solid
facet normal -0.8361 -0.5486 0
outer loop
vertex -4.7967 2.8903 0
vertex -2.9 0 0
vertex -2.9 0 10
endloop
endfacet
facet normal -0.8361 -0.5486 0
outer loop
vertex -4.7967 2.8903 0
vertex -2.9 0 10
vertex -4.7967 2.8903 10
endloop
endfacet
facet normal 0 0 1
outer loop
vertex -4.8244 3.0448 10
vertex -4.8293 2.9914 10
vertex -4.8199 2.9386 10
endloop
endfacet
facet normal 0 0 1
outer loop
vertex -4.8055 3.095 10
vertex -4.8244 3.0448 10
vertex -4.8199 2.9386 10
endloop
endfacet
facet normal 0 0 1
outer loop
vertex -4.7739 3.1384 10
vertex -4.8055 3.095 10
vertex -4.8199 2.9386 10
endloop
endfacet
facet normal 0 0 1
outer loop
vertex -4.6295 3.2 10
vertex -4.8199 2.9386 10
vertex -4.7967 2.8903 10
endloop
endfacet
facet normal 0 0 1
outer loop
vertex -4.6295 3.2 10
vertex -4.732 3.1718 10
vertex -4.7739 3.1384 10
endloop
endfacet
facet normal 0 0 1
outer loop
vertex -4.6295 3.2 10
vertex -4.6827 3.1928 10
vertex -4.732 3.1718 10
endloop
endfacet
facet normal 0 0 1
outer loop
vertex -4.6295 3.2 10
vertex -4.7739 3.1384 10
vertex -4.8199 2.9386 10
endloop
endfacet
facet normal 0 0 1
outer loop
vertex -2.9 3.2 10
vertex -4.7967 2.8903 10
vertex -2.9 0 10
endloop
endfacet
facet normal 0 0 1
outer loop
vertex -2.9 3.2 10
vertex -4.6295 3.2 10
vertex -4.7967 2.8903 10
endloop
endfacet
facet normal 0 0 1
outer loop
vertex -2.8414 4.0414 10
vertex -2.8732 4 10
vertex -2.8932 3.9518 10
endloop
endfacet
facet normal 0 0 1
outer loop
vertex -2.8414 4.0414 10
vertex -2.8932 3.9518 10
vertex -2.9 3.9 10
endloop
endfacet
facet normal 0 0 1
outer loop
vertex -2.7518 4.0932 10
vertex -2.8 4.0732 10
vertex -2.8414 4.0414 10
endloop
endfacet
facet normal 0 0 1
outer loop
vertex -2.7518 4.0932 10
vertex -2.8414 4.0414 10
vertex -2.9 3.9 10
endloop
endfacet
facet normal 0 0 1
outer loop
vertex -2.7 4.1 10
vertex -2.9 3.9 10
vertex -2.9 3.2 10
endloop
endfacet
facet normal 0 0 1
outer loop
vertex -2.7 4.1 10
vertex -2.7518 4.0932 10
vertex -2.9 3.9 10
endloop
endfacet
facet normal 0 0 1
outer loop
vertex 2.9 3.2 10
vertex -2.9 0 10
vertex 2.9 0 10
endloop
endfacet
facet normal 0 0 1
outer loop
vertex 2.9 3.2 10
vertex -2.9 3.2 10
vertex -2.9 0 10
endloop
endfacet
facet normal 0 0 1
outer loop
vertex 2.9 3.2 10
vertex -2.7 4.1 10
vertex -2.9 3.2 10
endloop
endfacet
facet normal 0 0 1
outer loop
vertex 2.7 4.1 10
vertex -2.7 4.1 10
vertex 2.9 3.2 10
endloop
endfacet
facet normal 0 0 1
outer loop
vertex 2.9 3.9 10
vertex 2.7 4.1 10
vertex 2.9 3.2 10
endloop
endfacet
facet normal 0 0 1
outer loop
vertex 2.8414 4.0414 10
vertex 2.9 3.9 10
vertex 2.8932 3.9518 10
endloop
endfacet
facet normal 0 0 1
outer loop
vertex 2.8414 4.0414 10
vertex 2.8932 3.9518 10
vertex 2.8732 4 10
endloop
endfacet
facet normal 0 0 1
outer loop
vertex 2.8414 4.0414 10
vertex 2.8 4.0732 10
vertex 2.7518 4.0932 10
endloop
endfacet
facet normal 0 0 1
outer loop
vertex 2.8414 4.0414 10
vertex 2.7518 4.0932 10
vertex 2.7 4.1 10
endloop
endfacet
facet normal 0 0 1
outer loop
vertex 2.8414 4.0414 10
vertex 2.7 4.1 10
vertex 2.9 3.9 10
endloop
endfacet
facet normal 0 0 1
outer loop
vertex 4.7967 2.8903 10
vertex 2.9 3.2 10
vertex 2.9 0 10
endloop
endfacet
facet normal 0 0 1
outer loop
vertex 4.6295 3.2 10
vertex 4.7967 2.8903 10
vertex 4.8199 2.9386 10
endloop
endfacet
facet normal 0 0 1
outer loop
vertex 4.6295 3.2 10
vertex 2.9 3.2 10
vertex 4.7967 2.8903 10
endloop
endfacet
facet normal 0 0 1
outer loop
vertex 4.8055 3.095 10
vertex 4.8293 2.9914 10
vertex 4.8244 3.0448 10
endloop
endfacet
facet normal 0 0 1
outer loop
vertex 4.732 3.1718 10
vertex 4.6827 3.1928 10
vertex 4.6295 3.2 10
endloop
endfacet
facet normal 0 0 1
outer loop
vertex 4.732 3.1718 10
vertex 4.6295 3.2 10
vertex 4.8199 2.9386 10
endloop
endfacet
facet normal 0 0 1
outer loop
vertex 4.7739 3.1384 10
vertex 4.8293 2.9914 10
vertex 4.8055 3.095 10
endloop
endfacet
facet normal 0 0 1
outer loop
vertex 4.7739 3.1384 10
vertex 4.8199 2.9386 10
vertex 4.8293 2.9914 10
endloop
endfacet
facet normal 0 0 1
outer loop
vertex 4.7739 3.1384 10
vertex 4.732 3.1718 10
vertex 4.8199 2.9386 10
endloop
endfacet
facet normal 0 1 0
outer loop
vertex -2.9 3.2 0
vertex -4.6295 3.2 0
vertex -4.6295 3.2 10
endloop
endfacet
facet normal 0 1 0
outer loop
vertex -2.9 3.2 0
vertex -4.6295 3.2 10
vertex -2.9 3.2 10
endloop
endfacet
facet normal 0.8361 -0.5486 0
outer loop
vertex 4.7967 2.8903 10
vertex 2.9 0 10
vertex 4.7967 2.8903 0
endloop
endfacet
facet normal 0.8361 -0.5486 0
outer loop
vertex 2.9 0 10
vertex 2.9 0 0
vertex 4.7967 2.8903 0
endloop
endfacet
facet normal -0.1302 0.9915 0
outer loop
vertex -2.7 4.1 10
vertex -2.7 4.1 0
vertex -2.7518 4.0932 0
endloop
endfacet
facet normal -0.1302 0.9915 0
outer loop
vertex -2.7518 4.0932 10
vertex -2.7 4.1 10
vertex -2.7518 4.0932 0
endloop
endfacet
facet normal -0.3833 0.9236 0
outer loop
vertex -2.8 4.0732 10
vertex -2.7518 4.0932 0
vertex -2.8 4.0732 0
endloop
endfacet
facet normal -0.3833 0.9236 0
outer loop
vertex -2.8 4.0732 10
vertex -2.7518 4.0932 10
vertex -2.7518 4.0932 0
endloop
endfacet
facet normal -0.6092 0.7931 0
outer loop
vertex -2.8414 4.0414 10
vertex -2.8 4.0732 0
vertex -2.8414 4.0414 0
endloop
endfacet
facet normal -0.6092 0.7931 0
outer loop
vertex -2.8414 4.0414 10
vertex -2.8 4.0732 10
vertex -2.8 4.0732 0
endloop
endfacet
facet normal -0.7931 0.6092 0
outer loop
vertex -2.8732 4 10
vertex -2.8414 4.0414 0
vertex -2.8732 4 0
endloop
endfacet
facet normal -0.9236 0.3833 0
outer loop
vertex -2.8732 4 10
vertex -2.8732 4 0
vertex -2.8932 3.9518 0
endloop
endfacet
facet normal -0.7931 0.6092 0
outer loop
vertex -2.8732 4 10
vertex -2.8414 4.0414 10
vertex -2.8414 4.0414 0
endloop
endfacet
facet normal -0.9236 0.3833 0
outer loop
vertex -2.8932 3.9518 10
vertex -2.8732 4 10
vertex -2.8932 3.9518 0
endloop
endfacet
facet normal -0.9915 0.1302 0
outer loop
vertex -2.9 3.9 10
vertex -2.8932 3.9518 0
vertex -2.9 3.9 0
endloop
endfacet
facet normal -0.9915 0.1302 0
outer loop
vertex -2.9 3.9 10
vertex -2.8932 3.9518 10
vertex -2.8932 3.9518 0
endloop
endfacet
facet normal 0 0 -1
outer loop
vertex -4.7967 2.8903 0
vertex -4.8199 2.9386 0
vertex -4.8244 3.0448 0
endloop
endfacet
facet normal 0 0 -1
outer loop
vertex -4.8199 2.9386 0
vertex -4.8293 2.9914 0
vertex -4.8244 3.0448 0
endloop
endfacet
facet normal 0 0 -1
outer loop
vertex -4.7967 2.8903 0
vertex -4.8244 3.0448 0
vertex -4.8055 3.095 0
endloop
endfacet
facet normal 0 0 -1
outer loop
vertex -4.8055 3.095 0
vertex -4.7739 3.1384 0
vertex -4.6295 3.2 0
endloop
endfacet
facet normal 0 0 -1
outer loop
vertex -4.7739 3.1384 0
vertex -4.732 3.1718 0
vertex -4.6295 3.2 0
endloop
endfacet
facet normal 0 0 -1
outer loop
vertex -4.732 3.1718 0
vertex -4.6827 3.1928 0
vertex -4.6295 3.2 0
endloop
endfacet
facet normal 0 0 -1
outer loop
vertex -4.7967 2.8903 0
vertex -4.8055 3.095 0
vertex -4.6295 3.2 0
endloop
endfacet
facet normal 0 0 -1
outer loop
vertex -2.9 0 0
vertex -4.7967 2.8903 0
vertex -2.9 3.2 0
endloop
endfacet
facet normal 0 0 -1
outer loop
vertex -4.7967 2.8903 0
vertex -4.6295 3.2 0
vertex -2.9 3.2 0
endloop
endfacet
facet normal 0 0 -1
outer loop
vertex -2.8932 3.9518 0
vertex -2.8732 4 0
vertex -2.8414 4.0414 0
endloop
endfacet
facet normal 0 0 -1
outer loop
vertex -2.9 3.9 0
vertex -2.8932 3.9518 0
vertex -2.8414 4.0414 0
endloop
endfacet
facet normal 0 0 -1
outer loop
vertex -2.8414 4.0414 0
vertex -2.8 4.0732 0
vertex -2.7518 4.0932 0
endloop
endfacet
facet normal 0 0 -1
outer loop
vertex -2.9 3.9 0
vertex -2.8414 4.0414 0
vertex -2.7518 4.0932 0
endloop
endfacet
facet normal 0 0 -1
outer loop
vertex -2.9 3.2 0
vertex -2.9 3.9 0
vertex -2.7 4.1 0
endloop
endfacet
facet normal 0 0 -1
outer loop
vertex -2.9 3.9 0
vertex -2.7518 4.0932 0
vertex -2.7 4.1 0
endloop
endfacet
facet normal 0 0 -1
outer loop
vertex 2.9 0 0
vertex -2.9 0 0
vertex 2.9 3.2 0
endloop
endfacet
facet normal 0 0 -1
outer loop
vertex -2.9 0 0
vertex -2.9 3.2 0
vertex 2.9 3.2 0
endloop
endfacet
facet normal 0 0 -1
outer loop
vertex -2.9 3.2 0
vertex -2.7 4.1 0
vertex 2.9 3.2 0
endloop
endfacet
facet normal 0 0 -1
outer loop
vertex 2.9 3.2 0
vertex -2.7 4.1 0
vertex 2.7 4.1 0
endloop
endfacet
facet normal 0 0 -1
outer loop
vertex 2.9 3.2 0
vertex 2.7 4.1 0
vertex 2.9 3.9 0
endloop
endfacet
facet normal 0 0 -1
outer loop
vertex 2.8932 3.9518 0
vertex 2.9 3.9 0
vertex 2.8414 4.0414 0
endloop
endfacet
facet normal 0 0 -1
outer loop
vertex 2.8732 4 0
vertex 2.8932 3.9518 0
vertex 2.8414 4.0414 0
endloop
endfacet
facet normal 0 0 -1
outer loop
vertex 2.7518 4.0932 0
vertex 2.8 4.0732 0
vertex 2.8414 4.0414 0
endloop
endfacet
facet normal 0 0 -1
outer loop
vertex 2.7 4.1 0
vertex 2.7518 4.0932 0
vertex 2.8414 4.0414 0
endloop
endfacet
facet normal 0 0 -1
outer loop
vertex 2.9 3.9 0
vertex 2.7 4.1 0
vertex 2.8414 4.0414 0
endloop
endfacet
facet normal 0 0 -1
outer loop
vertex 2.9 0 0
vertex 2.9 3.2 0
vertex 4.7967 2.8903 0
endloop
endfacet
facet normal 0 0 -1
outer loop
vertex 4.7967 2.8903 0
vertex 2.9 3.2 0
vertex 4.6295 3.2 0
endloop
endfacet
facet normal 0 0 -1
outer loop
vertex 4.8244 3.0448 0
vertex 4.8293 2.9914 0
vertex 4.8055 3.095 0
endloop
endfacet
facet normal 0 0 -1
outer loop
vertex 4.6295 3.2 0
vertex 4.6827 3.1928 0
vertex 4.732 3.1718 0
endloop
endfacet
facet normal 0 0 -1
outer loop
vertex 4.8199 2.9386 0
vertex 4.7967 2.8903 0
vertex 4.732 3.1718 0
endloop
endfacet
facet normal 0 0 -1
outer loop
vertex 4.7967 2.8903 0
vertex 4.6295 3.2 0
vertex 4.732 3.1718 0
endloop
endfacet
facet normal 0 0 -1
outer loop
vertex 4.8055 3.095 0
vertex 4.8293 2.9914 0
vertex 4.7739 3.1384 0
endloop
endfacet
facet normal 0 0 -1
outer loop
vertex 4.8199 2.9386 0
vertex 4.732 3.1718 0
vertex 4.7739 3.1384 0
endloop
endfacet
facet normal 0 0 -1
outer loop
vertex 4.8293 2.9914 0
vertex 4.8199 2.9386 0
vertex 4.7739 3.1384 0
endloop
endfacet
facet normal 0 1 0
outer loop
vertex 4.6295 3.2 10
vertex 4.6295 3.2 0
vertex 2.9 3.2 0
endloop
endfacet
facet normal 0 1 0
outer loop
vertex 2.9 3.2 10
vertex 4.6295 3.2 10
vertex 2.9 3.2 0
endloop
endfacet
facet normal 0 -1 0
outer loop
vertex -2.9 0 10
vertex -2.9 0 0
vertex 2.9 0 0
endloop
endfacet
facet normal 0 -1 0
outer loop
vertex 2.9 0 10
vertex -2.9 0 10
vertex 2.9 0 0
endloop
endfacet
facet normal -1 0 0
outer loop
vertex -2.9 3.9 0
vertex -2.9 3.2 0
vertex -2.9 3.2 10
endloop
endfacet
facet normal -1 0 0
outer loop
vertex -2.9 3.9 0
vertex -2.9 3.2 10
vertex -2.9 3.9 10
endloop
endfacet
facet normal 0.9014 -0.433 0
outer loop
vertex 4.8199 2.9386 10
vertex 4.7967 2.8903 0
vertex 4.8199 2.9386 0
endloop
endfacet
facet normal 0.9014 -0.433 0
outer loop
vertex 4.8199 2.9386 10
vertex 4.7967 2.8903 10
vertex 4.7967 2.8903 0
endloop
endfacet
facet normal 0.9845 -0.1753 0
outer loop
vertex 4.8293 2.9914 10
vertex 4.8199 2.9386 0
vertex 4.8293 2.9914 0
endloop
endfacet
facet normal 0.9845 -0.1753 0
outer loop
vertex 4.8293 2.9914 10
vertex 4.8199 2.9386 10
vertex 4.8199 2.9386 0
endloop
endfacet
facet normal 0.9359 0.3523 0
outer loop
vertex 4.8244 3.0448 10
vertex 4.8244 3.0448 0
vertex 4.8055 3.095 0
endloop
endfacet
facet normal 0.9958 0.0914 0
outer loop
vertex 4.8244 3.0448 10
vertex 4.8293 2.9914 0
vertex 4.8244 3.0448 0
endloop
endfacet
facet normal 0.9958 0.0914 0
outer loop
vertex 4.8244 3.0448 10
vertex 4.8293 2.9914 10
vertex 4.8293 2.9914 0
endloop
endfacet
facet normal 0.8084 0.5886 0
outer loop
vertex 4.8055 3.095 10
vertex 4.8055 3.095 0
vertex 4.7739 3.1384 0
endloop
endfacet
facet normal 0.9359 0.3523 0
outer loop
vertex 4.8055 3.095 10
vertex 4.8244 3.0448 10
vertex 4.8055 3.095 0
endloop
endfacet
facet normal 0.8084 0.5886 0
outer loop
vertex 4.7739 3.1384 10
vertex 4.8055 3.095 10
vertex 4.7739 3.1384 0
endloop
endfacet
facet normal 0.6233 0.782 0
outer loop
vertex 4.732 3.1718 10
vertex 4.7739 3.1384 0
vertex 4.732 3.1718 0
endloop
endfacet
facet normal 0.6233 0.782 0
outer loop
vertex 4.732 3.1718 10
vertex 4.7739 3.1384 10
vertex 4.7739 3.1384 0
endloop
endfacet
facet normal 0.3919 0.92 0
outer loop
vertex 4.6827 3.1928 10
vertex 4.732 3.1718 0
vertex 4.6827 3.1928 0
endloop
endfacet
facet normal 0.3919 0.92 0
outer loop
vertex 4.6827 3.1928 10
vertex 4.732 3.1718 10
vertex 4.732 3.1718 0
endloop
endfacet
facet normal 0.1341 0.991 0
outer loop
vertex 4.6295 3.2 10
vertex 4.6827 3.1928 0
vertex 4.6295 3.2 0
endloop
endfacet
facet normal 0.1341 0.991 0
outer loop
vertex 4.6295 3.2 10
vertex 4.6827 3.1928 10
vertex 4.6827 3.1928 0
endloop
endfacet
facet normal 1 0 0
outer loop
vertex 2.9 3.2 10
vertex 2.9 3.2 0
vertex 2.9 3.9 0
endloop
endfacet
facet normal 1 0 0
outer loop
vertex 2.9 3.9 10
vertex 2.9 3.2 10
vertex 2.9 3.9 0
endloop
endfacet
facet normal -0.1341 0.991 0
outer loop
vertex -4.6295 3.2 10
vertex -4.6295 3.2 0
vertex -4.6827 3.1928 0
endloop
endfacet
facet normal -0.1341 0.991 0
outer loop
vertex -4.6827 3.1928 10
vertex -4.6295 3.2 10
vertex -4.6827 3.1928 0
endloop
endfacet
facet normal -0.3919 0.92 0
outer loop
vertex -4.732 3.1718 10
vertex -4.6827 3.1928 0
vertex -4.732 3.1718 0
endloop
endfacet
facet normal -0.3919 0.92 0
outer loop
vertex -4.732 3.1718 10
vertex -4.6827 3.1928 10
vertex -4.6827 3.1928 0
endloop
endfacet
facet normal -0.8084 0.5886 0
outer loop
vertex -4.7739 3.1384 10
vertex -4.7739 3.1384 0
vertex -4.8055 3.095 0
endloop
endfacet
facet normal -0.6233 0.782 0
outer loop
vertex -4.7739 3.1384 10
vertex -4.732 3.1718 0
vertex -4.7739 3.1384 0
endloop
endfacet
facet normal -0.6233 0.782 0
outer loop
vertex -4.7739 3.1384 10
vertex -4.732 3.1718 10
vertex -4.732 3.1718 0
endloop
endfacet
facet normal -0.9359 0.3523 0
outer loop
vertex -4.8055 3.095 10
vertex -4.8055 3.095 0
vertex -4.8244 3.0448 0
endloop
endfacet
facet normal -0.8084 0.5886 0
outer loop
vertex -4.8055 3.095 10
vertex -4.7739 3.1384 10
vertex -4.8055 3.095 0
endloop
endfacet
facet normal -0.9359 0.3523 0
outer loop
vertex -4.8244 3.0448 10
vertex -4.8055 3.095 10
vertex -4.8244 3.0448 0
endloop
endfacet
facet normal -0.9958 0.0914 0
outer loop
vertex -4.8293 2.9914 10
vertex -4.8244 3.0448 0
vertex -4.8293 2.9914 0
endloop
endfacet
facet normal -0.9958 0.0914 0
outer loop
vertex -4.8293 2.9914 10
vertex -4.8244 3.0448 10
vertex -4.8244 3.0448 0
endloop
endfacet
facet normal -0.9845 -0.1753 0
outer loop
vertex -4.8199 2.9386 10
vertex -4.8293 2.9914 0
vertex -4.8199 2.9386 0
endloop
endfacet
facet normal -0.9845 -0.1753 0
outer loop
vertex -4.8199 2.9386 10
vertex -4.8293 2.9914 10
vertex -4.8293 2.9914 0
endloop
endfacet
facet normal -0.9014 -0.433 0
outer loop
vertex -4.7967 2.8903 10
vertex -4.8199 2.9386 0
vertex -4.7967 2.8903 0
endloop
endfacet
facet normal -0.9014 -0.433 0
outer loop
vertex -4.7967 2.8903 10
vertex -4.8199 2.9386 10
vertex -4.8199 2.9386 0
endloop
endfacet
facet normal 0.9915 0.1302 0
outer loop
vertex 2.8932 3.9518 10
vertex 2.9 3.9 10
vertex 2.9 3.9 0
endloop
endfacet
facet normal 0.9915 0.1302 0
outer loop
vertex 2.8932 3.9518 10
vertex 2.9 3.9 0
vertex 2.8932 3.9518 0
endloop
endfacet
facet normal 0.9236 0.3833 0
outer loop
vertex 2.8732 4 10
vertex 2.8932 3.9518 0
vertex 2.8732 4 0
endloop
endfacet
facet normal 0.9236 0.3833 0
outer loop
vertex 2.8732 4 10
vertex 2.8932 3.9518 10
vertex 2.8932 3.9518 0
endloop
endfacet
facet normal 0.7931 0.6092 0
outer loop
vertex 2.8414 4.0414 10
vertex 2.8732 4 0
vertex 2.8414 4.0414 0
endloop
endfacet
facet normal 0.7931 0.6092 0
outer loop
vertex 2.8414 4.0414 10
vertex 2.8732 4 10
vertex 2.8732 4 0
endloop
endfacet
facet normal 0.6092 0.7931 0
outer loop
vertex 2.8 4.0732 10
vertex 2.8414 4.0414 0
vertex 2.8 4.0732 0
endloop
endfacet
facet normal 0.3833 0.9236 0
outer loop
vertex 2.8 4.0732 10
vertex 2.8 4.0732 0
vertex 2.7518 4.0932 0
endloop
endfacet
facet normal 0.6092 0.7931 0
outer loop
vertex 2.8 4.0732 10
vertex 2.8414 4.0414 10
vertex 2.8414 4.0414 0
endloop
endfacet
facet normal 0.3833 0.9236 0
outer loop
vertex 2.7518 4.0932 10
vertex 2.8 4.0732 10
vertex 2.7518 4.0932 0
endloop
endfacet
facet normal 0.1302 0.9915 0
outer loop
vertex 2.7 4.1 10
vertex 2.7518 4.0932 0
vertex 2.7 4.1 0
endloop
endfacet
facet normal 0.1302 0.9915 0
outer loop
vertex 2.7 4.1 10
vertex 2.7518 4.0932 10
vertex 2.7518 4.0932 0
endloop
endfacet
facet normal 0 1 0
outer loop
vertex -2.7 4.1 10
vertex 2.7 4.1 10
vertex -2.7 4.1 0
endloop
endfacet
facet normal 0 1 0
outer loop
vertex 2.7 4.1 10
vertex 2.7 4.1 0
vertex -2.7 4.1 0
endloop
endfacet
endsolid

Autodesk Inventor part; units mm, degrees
ref_plane "YZ Plane" through (0, 0, 0) normal (1, 0, 0) x (0, 1, 0)
ref_plane "XZ Plane" through (0, 0, 0) normal (0, 1, 0) x (-1, 0, 0)
ref_plane "XY Plane" through (0, 0, 0) normal (0, 0, 1) x (1, 0, 0)
sketch "スケッチ1" plane through (0, 0, 0) normal (0, 0, 1) x (1, 0, 0)
  line L0 (0, 0) -> (2.9, 0)
  line L1 (2.9, 0) -> (5, 3.2)
  line L2 (5, 3.2) -> (0, 3.2)
  line L3 (0, 0) -> (0, 4)
  line L4 (0, 3.2) -> (2.9, 3.2)
  line L5 (2.9, 3.2) -> (2.9, 4.1)
  line L6 (2.9, 4.1) -> (0, 4.1)
  line L7 (0, 4.1) -> (0, 3.2)
  line L8 (0, 0) -> (-2.9, 0)
  line L9 (-2.9, 0) -> (-5, 3.2)
  line L10 (-5, 3.2) -> (0, 3.2)
  line L11 (-2.9, 3.2) -> (-2.9, 4.1)
  line L12 (-2.9, 4.1) -> (0, 4.1)
  dimension "d0" = 3.2
  dimension "d1" = 5
  dimension "d2" = 2.9
  dimension "d3" = 2.9
  dimension "d4" = 4.1
extrude "押し出し1" add sketch "スケッチ1" along normal blind 10
fillet "フィレット1" radius 0.2 2 edges at (5, 3.2, 5) (-5, 3.2, 5)
fillet "フィレット2" radius 0.2 2 edges at (-2.9, 4.1, 5) (2.9, 4.1, 5)
properties part number "framespacer1"
